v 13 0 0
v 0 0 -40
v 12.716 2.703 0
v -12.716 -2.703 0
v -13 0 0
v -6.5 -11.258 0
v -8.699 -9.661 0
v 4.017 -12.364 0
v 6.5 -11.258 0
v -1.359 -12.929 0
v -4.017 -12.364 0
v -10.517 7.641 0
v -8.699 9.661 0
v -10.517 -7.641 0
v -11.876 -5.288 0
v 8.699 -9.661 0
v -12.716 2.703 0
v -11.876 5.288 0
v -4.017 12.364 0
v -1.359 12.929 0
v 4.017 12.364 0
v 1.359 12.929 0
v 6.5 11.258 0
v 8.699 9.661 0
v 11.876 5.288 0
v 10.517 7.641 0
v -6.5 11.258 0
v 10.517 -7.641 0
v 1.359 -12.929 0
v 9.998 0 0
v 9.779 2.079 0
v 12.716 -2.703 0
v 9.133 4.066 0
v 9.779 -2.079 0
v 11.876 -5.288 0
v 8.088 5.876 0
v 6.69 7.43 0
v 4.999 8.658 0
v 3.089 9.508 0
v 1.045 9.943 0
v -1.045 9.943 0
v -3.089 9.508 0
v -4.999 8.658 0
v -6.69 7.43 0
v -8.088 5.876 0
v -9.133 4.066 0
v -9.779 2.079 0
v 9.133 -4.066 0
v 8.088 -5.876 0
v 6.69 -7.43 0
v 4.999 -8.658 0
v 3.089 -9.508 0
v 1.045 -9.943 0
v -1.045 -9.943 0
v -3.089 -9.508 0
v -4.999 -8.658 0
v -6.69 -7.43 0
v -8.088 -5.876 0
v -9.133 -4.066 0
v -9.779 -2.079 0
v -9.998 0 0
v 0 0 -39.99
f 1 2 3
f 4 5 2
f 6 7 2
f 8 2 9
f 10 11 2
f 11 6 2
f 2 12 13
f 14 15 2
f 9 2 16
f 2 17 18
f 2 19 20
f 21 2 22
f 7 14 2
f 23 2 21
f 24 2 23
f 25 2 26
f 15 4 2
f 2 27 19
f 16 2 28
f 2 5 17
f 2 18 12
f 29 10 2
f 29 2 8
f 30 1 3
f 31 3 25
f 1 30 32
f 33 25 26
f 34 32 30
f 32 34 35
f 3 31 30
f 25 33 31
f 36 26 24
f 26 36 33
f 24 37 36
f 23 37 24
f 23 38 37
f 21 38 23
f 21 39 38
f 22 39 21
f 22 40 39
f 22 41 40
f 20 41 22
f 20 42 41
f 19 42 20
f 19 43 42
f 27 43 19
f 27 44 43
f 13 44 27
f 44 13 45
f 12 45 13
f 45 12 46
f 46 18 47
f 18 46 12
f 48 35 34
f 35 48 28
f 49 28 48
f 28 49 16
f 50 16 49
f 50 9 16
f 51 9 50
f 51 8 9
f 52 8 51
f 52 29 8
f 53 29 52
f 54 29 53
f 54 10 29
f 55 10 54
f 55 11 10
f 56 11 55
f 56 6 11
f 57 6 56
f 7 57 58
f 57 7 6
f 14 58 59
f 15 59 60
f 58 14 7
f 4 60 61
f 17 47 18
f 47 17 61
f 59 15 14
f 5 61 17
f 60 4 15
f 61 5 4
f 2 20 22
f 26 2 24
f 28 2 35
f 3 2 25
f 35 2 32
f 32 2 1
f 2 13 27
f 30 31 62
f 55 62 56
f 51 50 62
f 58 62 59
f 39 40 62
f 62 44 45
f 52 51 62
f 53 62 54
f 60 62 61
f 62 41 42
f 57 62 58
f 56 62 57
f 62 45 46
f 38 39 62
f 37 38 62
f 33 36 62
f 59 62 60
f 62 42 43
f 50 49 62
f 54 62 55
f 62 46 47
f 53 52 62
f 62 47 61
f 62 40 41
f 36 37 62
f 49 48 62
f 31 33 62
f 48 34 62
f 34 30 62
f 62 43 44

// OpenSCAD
// Module représentant le cône de la glace
module Cone(r1 = 13, r2 = 0, h = 40) {
  color("white") {
    mirror([0,0,1]){
      cylinder(r1 = r1, r2 = r2, h = h, center = false);
    }
  }
}

// Ce module représente le trou au mileu de le cône
module Extrusion_du_cone(r = 10, h = 40)  {
  translate([0, 0, 0.01]){
    color([1,0.4,0]) {
      mirror([0,0,1]){
        cylinder(r1 = r, r2 = 0, h = h, center = false);
      }
    }
  }
}

// Module représentant la spirale décorative sur le cône
module Spirale_du_cone(h = 40, twist = 300, scale_factor = [0, 0]) {
  color("orange") {
    mirror([0,0,1]){
      translate([0, 0, 0]){
        linear_extrude(height = h, twist = twist, 
          scale = scale_factor, center = false){
          for (i = [-180 : abs(180) : 90]) {
            rotate([0, 0, (i * 25)]){
              translate([0, 13, 0]){
                circle(r=1.5);
              }
              translate([13, 0, 0]){
                circle(r=1.5);
              }
            }
          }
        }
      }
    }
  }
}

difference() {
  Cone();

  Extrusion_du_cone();
  Spirale_du_cone();
}
